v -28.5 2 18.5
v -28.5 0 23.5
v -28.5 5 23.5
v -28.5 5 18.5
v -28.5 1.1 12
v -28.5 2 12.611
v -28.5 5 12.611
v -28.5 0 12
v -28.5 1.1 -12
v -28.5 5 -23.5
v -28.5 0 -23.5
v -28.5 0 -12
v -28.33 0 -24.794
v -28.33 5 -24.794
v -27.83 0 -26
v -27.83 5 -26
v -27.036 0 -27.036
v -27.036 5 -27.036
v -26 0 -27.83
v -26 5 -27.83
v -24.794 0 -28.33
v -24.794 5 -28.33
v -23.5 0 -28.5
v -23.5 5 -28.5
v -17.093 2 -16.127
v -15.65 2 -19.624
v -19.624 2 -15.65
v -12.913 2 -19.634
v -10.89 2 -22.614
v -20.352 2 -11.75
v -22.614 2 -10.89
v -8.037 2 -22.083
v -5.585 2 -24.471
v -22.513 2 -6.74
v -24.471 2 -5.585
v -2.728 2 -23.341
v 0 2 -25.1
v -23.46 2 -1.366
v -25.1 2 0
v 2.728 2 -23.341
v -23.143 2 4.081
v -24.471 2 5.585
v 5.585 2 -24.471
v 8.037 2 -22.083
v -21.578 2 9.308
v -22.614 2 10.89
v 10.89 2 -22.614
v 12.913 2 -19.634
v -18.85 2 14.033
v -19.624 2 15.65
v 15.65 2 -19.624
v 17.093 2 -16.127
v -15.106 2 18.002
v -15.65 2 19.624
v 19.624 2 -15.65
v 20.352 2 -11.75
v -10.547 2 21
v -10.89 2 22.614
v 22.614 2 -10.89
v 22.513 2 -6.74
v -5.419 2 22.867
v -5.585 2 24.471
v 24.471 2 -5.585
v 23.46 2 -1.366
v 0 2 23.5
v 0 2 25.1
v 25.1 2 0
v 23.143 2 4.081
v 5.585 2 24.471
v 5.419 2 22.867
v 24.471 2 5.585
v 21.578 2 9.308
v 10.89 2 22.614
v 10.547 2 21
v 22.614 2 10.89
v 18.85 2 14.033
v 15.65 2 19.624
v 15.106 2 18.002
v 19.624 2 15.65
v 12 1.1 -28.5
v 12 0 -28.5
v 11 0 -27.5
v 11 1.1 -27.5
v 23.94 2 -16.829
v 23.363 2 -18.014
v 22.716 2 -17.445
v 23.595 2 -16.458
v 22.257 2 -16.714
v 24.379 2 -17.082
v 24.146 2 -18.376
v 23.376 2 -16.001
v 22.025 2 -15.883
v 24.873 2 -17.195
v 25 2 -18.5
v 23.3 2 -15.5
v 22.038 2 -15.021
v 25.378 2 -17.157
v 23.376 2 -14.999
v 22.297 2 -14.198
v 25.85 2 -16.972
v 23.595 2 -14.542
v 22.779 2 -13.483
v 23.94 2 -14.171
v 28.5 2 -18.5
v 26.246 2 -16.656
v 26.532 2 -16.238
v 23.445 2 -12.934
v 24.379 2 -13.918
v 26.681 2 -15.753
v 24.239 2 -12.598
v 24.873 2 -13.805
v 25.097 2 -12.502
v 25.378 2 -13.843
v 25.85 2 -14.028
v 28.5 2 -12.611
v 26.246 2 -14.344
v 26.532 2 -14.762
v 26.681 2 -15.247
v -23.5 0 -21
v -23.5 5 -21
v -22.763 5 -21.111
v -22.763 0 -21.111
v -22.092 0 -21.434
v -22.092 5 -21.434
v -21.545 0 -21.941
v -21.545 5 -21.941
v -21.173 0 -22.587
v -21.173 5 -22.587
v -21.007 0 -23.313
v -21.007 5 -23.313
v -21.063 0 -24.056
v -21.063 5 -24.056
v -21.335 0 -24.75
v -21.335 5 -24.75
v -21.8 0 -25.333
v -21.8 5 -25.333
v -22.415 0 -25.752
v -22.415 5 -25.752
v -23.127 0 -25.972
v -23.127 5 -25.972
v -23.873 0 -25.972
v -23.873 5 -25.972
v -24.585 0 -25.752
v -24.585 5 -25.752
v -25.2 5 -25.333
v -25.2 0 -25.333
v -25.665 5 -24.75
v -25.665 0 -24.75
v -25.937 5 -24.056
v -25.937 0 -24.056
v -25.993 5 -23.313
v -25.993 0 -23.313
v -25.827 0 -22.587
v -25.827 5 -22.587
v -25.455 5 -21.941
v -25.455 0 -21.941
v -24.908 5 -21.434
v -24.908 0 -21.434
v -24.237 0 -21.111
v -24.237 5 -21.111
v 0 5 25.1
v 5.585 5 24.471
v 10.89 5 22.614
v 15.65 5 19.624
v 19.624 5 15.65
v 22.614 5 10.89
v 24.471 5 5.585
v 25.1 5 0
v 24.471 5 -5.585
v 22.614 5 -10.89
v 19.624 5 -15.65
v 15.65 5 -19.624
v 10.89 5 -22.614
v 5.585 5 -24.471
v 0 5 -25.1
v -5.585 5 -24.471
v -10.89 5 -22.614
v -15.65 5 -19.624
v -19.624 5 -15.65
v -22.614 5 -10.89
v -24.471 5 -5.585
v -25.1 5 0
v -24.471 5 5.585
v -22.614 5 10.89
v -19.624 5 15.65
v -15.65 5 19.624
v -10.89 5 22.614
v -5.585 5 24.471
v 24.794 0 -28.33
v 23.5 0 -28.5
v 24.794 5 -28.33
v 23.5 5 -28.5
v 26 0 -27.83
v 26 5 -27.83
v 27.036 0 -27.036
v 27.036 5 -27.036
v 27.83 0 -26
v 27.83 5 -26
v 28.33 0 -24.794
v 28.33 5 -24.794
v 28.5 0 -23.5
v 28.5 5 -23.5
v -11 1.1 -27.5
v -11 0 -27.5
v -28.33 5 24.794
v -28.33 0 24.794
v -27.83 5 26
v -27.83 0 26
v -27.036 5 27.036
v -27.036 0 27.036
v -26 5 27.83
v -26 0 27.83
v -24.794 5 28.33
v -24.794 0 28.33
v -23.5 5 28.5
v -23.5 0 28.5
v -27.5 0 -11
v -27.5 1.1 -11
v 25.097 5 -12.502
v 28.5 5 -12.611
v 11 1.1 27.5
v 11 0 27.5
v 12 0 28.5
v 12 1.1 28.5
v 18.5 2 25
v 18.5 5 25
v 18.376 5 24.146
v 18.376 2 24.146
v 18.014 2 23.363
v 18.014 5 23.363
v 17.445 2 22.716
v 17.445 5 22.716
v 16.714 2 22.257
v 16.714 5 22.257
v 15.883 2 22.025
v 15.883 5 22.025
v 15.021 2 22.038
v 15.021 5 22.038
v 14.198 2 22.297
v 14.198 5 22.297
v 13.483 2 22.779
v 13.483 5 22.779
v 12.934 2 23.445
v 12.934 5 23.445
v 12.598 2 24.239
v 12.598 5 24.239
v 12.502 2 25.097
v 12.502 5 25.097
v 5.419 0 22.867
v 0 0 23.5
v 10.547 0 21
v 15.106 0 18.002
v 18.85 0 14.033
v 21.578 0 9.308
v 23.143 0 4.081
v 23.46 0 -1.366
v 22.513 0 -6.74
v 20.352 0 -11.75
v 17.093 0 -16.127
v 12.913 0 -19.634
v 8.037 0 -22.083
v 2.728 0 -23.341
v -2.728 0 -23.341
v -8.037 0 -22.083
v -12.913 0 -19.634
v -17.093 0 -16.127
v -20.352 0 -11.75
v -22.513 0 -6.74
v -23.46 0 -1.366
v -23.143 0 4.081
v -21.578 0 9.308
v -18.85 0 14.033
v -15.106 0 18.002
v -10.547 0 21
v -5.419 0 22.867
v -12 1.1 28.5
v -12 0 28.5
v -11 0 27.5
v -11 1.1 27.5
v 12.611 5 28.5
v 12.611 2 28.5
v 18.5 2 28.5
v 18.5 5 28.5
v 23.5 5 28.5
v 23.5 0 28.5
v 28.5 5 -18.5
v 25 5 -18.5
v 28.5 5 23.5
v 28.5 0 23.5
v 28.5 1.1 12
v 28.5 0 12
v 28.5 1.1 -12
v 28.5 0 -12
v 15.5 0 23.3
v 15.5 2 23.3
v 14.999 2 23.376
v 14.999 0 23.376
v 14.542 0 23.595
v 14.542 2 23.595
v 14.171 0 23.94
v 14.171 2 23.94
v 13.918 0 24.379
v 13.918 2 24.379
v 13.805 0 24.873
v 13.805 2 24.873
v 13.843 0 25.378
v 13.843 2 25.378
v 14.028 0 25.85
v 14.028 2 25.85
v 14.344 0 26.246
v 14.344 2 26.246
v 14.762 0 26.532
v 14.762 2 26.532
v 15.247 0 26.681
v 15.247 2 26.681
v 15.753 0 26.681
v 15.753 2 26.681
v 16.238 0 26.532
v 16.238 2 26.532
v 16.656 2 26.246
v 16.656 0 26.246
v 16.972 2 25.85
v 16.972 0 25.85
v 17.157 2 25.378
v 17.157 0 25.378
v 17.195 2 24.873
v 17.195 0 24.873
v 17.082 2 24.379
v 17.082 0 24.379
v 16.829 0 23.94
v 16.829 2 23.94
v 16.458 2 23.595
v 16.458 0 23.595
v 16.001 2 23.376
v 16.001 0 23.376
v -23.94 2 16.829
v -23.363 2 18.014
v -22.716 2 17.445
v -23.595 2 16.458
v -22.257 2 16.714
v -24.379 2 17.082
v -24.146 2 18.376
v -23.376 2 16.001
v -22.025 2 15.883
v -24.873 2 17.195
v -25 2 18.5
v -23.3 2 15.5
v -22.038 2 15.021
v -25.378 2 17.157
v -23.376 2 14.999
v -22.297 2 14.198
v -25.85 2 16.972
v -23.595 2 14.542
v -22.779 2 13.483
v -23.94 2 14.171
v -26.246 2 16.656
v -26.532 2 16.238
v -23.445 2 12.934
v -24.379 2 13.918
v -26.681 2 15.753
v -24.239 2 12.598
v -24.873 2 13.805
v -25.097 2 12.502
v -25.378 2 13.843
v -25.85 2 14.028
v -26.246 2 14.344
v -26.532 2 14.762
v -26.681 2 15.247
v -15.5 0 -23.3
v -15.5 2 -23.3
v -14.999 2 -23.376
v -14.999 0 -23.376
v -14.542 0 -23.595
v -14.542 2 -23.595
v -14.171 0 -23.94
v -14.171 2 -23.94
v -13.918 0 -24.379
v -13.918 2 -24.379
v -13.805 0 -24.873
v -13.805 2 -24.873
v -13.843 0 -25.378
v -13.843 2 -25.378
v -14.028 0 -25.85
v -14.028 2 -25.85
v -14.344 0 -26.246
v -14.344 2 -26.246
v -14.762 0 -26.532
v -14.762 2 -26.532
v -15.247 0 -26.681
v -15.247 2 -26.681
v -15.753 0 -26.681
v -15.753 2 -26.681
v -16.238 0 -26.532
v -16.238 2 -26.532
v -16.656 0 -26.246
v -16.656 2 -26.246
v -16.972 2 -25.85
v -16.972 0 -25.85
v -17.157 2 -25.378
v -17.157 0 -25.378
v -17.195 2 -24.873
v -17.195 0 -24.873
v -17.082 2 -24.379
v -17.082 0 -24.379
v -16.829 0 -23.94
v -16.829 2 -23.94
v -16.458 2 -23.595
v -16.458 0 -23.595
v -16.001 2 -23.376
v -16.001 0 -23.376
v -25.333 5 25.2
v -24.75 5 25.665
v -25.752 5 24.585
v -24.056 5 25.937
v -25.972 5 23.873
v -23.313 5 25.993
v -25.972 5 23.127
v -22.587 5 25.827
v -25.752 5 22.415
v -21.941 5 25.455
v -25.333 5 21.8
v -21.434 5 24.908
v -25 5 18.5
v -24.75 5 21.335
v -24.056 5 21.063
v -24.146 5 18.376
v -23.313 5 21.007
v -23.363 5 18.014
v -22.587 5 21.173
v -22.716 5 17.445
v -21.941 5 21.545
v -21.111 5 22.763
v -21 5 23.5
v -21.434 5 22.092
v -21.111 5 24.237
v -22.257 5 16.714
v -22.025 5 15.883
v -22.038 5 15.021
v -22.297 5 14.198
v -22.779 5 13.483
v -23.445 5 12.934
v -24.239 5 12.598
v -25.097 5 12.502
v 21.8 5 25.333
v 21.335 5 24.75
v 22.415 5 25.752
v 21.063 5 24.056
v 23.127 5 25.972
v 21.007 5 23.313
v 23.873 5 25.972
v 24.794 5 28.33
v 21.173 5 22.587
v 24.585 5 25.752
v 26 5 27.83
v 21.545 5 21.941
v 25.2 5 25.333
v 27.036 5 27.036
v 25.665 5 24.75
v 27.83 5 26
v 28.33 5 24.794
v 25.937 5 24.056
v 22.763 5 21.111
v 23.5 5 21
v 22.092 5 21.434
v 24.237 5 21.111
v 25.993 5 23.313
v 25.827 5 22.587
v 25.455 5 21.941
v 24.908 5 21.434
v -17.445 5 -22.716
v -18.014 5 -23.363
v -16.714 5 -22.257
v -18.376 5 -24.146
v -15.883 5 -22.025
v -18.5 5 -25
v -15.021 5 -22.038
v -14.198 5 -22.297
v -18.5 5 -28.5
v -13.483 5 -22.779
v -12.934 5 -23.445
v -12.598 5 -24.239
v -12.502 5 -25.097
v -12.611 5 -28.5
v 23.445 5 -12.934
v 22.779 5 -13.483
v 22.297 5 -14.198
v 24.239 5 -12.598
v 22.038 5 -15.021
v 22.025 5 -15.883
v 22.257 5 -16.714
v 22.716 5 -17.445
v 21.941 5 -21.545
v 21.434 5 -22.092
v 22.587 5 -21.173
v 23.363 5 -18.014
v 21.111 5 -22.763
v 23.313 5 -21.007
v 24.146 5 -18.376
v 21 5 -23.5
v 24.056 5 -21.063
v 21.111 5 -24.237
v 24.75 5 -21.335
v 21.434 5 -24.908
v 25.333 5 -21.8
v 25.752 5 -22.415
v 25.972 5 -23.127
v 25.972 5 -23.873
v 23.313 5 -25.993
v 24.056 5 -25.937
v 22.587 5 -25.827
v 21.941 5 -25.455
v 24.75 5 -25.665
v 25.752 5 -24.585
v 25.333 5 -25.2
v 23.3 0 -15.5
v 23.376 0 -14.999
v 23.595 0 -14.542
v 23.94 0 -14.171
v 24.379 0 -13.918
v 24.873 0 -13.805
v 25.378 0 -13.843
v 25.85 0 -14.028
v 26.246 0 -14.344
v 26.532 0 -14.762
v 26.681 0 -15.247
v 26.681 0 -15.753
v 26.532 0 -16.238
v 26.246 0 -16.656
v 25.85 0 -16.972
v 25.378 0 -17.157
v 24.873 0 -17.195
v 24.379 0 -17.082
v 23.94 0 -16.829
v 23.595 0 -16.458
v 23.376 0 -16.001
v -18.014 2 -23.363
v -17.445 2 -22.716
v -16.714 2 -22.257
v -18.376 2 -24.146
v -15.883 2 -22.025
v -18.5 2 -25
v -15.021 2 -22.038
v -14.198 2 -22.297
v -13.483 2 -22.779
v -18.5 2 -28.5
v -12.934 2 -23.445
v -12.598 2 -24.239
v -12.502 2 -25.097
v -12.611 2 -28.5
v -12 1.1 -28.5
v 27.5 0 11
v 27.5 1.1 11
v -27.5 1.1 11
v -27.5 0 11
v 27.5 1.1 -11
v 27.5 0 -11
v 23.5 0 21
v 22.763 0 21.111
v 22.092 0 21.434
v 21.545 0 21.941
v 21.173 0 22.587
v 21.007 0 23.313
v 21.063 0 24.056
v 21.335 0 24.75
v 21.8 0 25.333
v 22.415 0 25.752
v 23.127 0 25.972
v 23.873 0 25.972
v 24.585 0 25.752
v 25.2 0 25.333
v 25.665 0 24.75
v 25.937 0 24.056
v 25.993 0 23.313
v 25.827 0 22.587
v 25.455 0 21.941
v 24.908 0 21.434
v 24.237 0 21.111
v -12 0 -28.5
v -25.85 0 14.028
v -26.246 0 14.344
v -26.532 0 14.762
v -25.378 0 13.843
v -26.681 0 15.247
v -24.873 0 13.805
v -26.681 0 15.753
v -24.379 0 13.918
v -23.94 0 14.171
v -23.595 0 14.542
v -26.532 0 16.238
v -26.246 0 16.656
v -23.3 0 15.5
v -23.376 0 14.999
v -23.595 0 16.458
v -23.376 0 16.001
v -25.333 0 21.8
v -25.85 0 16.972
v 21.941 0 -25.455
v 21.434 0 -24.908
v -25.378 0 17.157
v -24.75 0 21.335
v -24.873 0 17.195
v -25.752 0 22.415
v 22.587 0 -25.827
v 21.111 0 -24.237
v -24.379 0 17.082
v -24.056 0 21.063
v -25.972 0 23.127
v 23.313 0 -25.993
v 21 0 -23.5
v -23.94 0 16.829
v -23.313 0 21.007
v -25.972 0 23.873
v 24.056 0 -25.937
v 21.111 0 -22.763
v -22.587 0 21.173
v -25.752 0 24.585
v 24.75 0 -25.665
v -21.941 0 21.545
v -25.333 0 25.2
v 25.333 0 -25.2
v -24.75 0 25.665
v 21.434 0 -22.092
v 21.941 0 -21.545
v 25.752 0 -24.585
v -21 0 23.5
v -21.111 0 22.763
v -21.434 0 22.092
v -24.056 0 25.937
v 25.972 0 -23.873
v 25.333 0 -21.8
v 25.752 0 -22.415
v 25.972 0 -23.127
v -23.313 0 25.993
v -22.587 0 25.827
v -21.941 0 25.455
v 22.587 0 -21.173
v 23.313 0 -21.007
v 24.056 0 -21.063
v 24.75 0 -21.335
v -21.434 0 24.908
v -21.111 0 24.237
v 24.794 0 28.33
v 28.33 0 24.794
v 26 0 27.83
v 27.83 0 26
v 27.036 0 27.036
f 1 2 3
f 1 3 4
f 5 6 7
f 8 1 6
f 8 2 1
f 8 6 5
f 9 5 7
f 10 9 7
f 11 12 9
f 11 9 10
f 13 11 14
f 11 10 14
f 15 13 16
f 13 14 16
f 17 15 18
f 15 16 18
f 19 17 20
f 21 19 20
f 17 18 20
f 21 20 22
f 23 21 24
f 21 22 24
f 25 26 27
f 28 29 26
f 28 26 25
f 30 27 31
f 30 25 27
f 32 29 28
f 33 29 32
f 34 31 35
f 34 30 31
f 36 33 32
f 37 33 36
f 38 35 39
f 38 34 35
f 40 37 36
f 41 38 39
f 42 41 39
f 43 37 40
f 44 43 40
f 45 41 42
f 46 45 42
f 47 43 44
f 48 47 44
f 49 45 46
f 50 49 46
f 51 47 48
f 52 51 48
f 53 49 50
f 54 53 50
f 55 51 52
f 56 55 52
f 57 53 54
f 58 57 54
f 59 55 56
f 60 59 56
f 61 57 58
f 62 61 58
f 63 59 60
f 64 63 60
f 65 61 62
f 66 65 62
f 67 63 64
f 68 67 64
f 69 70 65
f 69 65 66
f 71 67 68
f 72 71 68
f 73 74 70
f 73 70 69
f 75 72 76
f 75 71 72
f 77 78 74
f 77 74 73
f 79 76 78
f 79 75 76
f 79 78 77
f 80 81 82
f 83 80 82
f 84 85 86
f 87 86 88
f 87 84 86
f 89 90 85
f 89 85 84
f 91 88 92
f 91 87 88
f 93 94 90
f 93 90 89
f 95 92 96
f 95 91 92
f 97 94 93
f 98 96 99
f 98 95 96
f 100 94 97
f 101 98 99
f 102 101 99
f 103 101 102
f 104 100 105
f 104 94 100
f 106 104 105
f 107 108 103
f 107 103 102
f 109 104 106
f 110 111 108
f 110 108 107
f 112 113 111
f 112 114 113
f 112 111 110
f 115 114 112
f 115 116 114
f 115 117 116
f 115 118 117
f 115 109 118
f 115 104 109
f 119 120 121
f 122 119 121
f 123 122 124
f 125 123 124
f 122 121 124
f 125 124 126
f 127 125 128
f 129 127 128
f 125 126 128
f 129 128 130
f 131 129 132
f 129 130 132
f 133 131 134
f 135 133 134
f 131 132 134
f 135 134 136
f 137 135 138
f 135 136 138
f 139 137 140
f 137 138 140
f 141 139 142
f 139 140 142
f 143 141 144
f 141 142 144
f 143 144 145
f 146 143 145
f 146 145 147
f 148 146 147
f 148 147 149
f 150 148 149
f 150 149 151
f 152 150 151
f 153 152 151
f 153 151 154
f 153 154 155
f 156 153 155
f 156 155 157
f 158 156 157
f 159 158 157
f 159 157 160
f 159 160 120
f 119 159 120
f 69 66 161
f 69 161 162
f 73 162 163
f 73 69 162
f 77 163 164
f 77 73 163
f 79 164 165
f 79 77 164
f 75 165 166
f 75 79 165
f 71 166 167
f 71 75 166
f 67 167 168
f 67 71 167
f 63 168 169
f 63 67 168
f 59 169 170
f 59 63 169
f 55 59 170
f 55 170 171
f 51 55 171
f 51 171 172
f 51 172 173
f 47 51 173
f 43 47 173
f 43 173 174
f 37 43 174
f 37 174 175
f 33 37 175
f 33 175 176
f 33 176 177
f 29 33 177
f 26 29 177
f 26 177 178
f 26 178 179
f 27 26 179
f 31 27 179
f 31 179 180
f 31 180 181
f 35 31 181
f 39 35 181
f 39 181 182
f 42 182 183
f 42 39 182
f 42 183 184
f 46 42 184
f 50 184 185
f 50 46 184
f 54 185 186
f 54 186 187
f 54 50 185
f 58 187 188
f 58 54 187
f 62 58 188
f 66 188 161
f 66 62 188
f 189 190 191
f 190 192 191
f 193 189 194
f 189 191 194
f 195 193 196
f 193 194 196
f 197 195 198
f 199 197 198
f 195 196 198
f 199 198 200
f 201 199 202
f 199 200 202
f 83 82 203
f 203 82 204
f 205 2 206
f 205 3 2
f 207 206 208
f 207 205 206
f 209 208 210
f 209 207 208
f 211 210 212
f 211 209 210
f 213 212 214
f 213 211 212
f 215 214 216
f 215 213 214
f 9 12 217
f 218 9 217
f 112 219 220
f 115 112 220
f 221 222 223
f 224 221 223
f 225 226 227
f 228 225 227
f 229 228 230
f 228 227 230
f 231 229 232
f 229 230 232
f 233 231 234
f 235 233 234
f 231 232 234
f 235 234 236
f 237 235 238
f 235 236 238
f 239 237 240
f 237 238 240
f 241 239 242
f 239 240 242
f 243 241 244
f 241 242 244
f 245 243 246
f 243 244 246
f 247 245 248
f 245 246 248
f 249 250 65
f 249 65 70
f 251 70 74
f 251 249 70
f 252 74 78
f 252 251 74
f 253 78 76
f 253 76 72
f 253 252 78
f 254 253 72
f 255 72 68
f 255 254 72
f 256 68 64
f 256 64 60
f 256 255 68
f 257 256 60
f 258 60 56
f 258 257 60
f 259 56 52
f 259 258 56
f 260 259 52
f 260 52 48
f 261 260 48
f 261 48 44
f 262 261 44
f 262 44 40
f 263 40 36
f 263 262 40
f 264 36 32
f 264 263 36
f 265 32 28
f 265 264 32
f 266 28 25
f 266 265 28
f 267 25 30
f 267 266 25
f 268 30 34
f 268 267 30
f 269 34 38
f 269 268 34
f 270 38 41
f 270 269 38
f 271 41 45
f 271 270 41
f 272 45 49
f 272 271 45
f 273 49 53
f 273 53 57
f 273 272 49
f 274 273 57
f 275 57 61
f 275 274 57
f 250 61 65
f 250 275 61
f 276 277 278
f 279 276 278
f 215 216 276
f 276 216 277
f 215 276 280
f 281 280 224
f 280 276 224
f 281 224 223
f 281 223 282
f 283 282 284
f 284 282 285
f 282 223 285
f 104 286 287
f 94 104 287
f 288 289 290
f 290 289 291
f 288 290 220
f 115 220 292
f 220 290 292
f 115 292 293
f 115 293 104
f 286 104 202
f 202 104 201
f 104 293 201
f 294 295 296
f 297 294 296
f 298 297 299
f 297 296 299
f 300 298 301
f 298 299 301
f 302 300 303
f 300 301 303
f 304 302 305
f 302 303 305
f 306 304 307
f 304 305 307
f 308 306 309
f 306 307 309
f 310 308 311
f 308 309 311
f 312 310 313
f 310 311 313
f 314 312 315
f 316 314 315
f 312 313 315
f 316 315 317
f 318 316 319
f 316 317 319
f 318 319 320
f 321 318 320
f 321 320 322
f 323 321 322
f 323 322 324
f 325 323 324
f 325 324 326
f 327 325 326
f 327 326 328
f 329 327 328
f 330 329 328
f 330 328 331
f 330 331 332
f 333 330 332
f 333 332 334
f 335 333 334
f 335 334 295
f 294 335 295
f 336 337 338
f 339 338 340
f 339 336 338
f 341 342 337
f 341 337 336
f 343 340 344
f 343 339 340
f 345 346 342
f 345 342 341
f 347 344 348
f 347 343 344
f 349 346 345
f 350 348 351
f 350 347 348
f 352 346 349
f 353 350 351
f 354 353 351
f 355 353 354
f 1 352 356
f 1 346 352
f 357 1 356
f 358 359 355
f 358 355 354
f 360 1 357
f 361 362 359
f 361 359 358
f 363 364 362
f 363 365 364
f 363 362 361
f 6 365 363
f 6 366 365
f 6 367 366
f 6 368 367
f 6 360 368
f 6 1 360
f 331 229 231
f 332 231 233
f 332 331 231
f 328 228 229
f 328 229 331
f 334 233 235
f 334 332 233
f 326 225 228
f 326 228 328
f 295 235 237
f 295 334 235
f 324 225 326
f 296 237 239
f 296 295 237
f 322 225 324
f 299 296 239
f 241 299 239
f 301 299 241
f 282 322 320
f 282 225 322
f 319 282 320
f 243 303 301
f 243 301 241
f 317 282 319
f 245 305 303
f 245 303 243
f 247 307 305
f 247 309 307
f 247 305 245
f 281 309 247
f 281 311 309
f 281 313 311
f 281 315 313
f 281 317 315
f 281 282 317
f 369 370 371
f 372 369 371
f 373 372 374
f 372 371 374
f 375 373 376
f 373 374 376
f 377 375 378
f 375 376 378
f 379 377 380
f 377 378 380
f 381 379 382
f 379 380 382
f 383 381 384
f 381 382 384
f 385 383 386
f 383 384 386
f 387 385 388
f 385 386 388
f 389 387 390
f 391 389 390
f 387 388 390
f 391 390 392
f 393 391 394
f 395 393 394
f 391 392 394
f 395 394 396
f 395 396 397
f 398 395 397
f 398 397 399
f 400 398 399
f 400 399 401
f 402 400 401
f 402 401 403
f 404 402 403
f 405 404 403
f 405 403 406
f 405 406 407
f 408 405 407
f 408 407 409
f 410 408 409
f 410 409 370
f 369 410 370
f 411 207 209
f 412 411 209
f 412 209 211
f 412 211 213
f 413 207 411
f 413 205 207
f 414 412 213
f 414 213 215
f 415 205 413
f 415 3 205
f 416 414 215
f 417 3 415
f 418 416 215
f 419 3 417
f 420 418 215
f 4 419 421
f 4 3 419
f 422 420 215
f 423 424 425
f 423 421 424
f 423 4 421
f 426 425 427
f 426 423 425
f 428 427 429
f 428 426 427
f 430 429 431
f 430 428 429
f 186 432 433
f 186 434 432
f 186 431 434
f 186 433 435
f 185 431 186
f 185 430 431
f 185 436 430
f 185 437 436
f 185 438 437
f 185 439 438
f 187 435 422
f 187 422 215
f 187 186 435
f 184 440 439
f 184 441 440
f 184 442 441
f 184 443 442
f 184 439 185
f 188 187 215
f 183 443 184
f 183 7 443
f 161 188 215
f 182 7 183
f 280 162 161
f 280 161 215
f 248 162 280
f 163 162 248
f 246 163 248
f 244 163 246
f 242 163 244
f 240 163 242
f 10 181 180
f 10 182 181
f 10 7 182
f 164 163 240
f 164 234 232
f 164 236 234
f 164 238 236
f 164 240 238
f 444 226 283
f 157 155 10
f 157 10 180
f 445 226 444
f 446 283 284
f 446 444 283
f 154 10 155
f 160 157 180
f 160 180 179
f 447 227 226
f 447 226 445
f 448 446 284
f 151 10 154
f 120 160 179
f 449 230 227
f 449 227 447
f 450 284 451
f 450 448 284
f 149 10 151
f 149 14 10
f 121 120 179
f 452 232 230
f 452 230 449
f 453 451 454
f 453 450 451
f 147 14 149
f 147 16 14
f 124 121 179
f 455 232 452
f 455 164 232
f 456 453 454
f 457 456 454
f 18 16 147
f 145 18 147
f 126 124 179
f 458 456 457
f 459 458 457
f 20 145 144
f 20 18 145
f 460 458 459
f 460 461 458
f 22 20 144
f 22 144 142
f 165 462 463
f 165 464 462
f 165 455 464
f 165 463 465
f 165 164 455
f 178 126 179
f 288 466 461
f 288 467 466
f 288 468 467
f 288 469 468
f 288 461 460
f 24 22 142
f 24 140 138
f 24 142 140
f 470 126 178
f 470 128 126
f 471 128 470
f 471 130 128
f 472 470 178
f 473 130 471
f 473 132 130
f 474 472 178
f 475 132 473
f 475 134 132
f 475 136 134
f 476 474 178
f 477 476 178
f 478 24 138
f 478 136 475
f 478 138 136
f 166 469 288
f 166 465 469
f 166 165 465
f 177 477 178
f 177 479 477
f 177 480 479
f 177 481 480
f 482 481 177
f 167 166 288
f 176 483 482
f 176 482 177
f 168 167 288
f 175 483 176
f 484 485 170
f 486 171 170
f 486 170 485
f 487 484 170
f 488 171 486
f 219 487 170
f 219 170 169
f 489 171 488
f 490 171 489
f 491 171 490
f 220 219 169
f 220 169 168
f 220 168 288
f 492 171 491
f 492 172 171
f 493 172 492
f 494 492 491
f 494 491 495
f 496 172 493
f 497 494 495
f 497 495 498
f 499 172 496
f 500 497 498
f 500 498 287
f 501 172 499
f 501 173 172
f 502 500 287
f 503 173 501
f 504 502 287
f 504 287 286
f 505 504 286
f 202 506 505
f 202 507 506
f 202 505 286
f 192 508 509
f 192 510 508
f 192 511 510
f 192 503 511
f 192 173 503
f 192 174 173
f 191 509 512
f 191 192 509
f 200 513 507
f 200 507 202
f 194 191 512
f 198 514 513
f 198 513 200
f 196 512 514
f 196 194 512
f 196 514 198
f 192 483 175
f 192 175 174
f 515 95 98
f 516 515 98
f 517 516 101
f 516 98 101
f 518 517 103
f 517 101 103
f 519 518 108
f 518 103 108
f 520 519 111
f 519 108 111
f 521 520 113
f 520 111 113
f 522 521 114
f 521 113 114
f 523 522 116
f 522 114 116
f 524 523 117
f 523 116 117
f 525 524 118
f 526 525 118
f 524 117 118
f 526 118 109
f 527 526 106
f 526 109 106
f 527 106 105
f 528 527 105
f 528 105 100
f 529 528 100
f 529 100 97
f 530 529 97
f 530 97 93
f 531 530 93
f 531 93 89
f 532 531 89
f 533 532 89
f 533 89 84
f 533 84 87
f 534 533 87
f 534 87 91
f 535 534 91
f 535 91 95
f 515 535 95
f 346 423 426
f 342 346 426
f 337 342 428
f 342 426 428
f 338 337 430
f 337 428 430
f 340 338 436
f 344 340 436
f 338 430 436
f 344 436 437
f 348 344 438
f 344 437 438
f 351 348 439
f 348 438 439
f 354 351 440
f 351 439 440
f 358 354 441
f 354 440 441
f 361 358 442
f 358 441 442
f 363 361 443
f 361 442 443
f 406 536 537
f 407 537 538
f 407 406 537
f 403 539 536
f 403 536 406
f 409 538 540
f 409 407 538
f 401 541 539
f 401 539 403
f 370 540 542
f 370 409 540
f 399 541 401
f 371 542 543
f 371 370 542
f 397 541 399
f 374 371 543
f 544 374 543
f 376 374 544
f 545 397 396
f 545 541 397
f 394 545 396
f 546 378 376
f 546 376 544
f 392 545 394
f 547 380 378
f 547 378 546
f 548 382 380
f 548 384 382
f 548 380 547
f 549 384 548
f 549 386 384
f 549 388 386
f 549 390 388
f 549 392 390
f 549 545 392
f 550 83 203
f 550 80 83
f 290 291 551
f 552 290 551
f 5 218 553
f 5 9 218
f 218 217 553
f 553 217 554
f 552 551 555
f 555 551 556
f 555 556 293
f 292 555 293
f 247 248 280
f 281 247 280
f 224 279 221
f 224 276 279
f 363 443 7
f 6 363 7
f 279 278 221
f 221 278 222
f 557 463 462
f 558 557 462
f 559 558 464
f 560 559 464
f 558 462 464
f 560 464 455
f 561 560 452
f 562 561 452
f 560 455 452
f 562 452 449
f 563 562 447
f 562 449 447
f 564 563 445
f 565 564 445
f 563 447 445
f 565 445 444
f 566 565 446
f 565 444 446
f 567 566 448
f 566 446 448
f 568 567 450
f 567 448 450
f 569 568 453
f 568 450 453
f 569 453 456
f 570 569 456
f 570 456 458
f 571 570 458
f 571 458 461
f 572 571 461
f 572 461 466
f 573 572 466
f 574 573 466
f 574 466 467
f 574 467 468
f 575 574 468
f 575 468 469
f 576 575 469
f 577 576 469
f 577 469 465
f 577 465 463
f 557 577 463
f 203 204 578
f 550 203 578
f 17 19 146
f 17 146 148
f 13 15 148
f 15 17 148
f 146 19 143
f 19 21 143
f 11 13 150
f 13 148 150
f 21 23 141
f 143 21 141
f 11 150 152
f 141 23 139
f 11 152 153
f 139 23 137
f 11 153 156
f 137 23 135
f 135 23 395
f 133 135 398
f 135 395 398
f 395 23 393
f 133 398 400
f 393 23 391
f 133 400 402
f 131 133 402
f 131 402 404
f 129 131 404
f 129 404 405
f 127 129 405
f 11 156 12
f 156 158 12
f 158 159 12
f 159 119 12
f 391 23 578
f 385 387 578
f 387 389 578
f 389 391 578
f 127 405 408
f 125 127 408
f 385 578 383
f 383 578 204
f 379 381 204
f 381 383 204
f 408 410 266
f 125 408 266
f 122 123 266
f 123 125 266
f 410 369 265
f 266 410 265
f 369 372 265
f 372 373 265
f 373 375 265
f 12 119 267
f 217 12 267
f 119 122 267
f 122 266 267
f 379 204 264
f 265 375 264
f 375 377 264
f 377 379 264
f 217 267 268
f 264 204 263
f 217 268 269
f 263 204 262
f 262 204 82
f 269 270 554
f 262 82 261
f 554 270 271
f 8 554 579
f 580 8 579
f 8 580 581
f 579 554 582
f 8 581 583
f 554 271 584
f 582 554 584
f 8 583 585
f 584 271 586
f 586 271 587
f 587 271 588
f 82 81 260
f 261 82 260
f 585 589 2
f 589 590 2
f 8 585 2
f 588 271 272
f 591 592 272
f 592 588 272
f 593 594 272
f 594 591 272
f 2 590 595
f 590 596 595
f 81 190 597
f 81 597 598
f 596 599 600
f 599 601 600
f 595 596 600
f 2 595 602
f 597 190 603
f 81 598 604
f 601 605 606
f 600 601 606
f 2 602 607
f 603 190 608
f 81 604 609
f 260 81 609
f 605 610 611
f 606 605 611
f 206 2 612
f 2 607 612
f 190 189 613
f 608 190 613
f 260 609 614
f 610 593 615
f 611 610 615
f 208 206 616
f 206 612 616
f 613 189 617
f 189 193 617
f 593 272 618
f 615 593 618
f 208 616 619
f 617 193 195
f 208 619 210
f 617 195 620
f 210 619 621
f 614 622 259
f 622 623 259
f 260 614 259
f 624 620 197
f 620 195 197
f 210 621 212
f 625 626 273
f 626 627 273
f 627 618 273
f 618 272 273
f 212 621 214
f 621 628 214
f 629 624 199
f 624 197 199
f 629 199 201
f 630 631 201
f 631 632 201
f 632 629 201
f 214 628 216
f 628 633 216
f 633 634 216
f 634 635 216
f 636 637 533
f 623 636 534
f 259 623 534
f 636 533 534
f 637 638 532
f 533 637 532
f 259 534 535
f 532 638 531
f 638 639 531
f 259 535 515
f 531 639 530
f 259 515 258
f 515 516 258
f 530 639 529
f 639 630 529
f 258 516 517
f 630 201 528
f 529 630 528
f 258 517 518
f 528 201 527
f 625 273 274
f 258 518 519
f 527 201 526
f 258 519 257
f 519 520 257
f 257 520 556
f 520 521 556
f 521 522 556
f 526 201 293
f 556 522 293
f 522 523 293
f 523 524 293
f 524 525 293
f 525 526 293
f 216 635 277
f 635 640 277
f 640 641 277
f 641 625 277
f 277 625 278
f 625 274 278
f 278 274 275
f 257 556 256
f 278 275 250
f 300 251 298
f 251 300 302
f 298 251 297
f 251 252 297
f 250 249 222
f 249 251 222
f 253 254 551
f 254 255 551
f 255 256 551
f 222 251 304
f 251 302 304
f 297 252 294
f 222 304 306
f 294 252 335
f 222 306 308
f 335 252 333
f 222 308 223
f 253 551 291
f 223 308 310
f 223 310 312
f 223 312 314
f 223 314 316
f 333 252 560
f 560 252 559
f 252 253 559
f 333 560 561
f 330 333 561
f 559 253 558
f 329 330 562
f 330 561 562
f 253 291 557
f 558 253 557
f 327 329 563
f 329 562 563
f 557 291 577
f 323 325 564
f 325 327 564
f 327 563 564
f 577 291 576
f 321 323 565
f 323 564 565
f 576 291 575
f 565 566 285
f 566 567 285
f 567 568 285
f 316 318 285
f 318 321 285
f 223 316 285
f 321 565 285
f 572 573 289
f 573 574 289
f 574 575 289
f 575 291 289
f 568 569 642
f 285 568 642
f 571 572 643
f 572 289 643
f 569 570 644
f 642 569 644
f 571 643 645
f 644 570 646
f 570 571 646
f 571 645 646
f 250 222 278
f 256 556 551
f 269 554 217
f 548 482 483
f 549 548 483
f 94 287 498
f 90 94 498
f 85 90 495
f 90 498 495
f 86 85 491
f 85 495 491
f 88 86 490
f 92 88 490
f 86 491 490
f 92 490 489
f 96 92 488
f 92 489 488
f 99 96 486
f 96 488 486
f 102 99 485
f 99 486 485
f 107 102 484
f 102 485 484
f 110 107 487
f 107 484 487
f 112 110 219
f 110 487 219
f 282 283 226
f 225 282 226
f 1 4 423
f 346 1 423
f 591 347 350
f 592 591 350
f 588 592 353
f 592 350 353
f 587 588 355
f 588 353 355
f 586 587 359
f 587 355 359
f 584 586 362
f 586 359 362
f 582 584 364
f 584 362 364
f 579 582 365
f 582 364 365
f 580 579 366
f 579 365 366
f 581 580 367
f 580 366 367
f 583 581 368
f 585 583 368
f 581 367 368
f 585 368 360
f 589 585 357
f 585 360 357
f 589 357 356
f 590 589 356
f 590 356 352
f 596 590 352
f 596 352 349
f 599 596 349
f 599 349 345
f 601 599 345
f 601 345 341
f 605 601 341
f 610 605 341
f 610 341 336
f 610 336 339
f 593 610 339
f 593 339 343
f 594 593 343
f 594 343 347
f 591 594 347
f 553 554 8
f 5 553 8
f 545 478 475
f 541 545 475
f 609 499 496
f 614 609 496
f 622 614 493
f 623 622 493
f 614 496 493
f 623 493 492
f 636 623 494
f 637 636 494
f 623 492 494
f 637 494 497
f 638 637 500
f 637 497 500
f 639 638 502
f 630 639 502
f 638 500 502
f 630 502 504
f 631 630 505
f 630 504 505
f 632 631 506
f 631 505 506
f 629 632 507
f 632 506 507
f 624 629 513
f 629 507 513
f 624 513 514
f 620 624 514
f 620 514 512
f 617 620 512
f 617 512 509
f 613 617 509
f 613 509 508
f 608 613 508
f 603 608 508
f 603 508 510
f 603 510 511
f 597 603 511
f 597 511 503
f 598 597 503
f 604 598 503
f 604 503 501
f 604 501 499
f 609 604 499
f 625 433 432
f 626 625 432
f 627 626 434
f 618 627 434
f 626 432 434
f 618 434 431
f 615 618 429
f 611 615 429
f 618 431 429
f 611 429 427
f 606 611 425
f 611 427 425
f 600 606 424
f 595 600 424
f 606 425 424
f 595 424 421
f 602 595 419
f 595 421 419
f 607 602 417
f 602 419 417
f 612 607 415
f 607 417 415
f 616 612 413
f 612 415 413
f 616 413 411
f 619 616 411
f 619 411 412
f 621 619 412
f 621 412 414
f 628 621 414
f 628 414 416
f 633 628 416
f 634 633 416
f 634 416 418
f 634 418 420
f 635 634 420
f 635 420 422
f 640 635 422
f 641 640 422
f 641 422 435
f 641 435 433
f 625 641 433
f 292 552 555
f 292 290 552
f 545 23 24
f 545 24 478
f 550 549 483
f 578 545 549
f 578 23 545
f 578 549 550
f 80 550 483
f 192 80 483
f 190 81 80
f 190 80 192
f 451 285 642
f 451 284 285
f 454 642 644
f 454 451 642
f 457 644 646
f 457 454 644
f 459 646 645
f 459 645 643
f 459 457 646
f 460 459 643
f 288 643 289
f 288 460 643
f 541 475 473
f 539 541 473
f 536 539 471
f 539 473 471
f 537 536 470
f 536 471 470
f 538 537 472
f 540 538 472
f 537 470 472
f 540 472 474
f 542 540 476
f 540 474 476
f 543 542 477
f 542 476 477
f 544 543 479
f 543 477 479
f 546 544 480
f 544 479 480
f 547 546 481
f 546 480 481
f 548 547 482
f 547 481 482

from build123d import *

# Parameters (mm, degrees)
SKETCH1_W           = 57
SKETCH1_H           = 57
SKETCH1_R           = 25.1
BOSS_EXTRUDE1_DEPTH = 5
SKETCH1_3_R         = 25.1
SKETCH1_3_R_2       = 23.5
BOSS_EXTRUDE2_DEPTH = 2
FILLET1_R           = 5
SKETCH2_R           = 2.5
SKETCH2_R_2         = 1.7
CUT_EXTRUDE2_DEPTH  = 41.614036982
SKETCH3_R           = 1.7
CUT_EXTRUDE3_DEPTH  = 3
CUT_EXTRUDE4_DEPTH  = 1.1
CIRPATTERN1_COUNT   = 4


with BuildPart() as part:
    # Sketch1 → Boss-Extrude1 (new body)
    with BuildSketch(Plane(origin=(0, 0, 0), x_dir=(1, 0, 0), z_dir=(0, 1, 0))):
        Rectangle(SKETCH1_W, SKETCH1_H)
        Circle(SKETCH1_R, mode=Mode.SUBTRACT)
    extrude(amount=BOSS_EXTRUDE1_DEPTH)

    # Sketch1<3> → Boss-Extrude2 (add)
    with BuildSketch(Plane(origin=(0, 0, 0), x_dir=(1, 0, 0), z_dir=(0, 1, 0))):
        Circle(SKETCH1_3_R)
        Circle(SKETCH1_3_R_2, mode=Mode.SUBTRACT)
    extrude(amount=BOSS_EXTRUDE2_DEPTH)

    # Fillet1
    fillet1_edges = [part.edges().sort_by_distance(p)[0] for p in [
        (-28.5, 2.5, -28.5),
        (28.5, 2.5, -28.5),
        (-28.5, 2.5, 28.5),
        (28.5, 2.5, 28.5),
    ]]
    fillet(fillet1_edges, radius=FILLET1_R)

    # Sketch2 → Cut-Extrude2 (cut, through all)
    with BuildSketch(Plane(origin=(0, 5, 0), x_dir=(1, 0, 0), z_dir=(0, 1, 0))):
        with Locations((-23.5, 23.5)):
            Circle(SKETCH2_R)
        with Locations((-15.5, 25)):
            Circle(SKETCH2_R_2)
    cut_extrude2 = extrude(amount=-CUT_EXTRUDE2_DEPTH, mode=Mode.SUBTRACT)

    # Sketch3 → Cut-Extrude3 (cut)
    with BuildSketch(Plane(origin=(0, 5, 0), x_dir=(1, 0, 0), z_dir=(0, 1, 0))):
        with BuildLine():
            ThreePointArc((-18.5, 25), (-15.451669698, 22.000389328), (-12.501557212, 25.09664806))
            Line((-12.501557212, 25.09664806), (-12.611256608, 28.5))
            Line((-12.611256608, 28.5), (-18.5, 28.5))
            Line((-18.5, 28.5), (-18.5, 25))
        make_face()
        with Locations((-15.5, 25)):
            Circle(SKETCH3_R, mode=Mode.SUBTRACT)
    cut_extrude3 = extrude(amount=-CUT_EXTRUDE3_DEPTH, mode=Mode.SUBTRACT)

    # Sketch4 → Cut-Extrude4 (cut)
    with BuildSketch(Plane.XZ):
        Polygon((-27.5, -11), (-27.5, 11), (-28.5, 12), (-28.5, -12), align=None)
    cut_extrude4 = extrude(amount=-CUT_EXTRUDE4_DEPTH, mode=Mode.SUBTRACT)

    # CirPattern1: Cut-Extrude2, Cut-Extrude3, Cut-Extrude4 ×4 about axis
    cirpattern1_axis = Axis((0, 2, 0), (0, 1, 0))
    add([cut_extrude2.rotate(cirpattern1_axis, i * 360 / CIRPATTERN1_COUNT) for i in range(1, CIRPATTERN1_COUNT)], mode=Mode.SUBTRACT)
    add([cut_extrude3.rotate(cirpattern1_axis, i * 360 / CIRPATTERN1_COUNT) for i in range(1, CIRPATTERN1_COUNT)], mode=Mode.SUBTRACT)
    add([cut_extrude4.rotate(cirpattern1_axis, i * 360 / CIRPATTERN1_COUNT) for i in range(1, CIRPATTERN1_COUNT)], mode=Mode.SUBTRACT)


solid = part.part
